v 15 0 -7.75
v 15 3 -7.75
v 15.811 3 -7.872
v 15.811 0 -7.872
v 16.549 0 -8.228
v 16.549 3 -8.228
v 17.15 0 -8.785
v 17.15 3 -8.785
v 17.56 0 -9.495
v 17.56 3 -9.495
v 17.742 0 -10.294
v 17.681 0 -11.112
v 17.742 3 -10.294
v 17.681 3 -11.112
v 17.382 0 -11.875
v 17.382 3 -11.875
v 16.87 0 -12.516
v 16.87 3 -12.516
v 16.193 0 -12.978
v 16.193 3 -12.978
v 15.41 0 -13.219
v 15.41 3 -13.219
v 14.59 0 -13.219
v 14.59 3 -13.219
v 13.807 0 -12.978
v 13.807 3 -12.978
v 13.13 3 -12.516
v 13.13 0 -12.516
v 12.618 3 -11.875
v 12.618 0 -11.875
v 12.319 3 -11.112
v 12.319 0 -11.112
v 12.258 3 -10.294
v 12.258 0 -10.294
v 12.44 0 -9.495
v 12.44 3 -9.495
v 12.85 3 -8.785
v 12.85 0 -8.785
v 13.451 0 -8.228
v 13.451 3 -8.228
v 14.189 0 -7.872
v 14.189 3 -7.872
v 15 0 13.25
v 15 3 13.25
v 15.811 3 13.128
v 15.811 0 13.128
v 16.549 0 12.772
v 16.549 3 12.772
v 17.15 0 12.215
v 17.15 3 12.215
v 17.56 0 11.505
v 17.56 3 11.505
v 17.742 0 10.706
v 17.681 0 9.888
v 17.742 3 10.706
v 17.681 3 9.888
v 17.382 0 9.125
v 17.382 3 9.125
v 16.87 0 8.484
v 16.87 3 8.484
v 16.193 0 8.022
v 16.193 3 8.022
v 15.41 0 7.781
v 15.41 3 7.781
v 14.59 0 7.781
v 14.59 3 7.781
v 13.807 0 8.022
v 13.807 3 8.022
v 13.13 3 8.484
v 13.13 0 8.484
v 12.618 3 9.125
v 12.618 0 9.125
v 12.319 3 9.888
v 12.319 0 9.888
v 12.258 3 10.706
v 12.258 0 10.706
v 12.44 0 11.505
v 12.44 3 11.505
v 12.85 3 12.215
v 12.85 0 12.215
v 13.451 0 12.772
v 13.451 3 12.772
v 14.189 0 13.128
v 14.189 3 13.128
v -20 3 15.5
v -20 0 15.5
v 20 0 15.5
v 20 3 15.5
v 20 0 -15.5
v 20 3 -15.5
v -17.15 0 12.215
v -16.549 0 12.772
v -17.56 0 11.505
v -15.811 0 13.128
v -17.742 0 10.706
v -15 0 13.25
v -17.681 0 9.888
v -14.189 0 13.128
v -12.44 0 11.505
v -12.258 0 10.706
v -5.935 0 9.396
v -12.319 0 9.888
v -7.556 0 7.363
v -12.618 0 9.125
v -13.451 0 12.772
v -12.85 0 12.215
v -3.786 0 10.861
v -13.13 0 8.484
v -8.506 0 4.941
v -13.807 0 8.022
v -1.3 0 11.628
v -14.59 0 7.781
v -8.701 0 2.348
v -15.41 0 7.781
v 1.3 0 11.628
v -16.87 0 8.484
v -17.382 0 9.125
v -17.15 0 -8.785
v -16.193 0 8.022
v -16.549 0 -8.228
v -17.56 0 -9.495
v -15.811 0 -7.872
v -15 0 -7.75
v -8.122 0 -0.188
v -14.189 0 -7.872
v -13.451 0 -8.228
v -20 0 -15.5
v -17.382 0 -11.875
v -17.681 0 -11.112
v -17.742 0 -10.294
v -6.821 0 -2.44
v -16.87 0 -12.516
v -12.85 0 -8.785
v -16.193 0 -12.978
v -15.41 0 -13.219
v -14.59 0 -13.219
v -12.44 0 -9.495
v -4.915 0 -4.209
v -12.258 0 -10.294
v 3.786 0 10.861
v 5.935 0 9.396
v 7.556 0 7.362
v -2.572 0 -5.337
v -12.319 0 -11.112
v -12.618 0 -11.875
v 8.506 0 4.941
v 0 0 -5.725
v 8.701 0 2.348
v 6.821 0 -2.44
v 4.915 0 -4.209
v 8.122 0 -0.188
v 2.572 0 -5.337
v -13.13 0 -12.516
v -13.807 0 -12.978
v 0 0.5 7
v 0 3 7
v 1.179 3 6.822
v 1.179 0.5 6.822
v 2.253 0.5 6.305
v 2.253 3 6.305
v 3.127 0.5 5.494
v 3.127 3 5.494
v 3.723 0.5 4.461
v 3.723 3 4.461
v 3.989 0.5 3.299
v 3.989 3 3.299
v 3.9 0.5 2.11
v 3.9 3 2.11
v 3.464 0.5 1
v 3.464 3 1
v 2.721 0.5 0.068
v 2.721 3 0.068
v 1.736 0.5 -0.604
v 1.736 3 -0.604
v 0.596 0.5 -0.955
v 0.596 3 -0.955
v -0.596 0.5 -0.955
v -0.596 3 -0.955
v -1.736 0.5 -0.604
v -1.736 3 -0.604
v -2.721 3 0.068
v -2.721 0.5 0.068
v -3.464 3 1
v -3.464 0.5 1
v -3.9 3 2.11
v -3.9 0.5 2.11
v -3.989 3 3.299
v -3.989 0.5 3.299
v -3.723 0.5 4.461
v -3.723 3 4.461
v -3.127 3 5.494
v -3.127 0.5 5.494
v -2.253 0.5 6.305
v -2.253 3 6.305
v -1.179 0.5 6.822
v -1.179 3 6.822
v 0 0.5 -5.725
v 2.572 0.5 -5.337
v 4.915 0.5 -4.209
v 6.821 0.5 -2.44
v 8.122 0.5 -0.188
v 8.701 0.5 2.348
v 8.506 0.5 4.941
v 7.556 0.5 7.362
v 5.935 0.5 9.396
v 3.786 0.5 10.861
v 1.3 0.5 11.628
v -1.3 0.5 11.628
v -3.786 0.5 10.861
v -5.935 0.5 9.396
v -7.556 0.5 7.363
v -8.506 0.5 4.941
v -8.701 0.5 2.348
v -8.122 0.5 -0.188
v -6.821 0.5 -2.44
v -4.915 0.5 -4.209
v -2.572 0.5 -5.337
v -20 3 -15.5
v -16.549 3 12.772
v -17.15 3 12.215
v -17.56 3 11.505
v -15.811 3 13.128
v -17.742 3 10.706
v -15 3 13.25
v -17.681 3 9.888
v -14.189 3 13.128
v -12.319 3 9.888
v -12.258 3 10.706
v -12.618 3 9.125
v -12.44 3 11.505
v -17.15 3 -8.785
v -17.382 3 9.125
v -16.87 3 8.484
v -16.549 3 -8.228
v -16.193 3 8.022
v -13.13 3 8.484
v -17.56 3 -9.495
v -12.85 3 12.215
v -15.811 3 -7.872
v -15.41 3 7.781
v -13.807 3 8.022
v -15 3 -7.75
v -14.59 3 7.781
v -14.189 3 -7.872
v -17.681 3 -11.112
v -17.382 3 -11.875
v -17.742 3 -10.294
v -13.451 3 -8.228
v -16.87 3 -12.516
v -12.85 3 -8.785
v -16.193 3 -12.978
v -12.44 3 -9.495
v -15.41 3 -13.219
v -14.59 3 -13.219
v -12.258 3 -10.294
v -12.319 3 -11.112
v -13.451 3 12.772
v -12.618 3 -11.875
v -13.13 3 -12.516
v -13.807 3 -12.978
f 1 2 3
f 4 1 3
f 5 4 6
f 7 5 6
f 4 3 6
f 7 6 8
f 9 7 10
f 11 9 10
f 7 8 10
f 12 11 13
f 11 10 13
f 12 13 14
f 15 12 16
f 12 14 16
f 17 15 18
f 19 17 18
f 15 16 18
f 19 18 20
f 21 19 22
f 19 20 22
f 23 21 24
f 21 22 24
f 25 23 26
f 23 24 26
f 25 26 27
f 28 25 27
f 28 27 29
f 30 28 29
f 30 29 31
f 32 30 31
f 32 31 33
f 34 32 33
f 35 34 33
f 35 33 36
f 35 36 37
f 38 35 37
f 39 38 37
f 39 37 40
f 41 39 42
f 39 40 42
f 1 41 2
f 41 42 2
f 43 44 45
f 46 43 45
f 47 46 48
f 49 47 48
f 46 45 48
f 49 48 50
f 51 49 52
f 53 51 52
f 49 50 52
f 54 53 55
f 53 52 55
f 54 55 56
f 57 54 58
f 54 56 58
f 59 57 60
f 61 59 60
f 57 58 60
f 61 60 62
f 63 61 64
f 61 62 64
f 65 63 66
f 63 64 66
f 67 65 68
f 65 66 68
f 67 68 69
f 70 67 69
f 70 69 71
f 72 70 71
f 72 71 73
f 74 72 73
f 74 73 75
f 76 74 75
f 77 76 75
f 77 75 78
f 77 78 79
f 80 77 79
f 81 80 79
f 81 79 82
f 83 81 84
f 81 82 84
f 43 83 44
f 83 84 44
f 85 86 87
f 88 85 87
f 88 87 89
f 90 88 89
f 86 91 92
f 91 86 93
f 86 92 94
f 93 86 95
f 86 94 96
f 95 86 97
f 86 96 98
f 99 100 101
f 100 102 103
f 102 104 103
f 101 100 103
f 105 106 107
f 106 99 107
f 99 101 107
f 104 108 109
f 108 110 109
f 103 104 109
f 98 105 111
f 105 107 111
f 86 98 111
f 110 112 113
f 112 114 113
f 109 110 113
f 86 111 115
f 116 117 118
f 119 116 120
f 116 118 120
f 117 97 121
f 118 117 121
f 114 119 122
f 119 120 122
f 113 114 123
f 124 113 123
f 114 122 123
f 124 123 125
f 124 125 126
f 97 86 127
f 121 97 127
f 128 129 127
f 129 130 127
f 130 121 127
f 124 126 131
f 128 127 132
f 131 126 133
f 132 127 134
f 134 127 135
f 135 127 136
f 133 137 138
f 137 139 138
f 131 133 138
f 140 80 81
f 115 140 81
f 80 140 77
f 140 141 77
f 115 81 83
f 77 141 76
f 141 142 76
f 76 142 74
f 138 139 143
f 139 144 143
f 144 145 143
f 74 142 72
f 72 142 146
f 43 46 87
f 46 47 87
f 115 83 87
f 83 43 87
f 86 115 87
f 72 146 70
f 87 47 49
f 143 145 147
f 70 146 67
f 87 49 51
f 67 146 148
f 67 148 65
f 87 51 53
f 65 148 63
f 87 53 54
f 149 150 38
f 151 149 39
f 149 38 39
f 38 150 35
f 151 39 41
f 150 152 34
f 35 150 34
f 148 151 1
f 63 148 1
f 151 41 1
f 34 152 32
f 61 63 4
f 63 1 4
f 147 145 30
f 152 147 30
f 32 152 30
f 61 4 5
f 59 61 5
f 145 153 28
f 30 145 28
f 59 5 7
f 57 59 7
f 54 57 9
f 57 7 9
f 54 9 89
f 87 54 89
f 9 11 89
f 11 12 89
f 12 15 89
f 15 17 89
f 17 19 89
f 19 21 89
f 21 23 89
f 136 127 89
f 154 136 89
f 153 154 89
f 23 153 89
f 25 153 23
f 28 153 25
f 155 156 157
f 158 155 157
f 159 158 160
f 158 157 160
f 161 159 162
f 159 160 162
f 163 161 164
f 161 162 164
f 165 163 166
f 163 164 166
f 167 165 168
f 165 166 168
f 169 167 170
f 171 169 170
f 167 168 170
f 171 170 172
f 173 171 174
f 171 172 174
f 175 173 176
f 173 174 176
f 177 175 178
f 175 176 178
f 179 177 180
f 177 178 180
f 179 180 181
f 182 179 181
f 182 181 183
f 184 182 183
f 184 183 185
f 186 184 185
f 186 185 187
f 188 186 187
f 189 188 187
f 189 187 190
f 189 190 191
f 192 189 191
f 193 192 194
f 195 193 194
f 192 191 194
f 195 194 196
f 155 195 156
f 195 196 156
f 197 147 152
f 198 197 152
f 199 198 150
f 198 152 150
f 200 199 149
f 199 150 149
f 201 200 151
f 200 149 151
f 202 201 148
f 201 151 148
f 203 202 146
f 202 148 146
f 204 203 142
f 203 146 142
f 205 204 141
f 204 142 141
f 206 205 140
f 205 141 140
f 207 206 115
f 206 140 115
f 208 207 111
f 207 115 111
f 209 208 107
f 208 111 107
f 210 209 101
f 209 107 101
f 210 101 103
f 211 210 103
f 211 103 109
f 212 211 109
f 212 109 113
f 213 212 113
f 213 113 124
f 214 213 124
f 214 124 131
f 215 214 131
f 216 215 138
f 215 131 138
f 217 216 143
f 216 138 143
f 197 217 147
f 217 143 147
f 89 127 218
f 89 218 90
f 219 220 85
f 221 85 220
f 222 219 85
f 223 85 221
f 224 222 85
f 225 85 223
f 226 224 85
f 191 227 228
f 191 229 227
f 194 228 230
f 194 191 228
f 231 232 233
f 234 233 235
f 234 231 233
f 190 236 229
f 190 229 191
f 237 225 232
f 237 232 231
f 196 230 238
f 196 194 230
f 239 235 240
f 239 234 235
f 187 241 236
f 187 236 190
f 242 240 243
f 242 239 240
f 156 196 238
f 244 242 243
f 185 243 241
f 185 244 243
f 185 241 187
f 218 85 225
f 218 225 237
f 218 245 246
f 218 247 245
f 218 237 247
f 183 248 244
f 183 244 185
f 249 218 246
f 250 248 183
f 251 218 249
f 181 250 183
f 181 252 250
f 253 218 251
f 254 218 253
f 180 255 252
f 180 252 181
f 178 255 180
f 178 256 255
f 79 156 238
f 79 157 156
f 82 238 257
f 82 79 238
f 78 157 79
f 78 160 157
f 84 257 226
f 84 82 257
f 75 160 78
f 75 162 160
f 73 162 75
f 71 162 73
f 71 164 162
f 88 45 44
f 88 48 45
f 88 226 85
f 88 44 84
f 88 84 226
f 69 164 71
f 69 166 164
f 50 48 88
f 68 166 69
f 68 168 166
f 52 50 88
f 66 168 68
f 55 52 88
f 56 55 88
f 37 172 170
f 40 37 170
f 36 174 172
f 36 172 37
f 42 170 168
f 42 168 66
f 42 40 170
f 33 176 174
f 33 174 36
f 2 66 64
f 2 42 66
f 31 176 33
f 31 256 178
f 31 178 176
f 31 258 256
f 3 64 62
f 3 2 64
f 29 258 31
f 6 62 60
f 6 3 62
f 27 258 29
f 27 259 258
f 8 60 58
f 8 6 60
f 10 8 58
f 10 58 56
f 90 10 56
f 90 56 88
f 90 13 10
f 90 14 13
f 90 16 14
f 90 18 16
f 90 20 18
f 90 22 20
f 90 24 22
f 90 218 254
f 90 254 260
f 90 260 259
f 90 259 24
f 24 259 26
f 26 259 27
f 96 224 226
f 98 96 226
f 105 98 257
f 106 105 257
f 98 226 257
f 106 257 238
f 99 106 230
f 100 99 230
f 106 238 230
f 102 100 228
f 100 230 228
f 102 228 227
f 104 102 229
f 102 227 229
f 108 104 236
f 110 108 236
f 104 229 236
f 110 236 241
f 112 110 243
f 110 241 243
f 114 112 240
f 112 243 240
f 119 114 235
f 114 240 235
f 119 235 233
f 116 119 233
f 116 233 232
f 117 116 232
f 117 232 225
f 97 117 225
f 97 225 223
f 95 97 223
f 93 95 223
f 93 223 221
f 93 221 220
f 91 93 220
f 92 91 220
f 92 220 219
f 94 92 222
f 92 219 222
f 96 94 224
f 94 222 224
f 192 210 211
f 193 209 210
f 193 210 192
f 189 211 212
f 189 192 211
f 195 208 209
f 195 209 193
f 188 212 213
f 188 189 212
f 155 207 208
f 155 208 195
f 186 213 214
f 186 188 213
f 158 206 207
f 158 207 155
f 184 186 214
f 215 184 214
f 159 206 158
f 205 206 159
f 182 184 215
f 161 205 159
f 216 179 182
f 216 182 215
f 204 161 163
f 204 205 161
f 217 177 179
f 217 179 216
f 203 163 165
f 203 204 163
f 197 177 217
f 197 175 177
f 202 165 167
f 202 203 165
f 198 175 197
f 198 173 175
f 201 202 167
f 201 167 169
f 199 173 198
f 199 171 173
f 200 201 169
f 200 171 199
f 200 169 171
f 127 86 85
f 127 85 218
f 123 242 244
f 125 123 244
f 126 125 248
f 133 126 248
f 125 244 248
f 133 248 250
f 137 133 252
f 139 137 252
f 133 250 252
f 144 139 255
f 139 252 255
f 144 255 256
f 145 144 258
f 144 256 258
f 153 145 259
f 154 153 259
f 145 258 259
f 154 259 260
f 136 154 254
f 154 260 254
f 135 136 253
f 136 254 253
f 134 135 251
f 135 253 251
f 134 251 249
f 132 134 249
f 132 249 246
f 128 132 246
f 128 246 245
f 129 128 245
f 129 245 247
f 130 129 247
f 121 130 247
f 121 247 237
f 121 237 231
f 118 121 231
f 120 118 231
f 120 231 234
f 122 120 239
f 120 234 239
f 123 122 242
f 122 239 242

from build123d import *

# Parameters (mm, degrees)
SKETCH1_W           = 40
SKETCH1_H           = 31
BOSS_EXTRUDE1_DEPTH = 3
SKETCH2_R           = 2.75
CUT_EXTRUDE1_DEPTH  = 3
SKETCH3_R           = 8.725
CUT_EXTRUDE2_DEPTH  = 0.5
SKETCH4_R           = 4
CUT_EXTRUDE3_DEPTH  = 2.5


with BuildPart() as part:
    # Sketch1 → Boss-Extrude1 (new body)
    with BuildSketch(Plane(origin=(0, 0, 0), x_dir=(1, 0, 0), z_dir=(0, 1, 0))):
        Rectangle(SKETCH1_W, SKETCH1_H)
    extrude(amount=BOSS_EXTRUDE1_DEPTH)

    # Sketch2 → Cut-Extrude1 (cut)
    with BuildSketch(Plane(origin=(0, 3, 0), x_dir=(1, 0, 0), z_dir=(0, 1, 0))):
        with Locations(Location((-15, 10.5, 0), (0, 0, 270))):
            Circle(SKETCH2_R)
        with Locations(Location((15, 10.5, 0), (0, 0, 270))):
            Circle(SKETCH2_R)
        with Locations(Location((15, -10.5, 0), (0, 0, 270))):
            Circle(SKETCH2_R)
        with Locations(Location((-15, -10.5, 0), (0, 0, 270))):
            Circle(SKETCH2_R)
    extrude(amount=-CUT_EXTRUDE1_DEPTH, mode=Mode.SUBTRACT)

    # Sketch3 → Cut-Extrude2 (cut)
    with BuildSketch(Plane.XZ):
        with Locations(Location((0, 3, 0), (0, 0, 270))):
            Circle(SKETCH3_R)
    extrude(amount=-CUT_EXTRUDE2_DEPTH, mode=Mode.SUBTRACT)

    # Sketch4 → Cut-Extrude3 (cut)
    with BuildSketch(Plane(origin=(0, 3, 0), x_dir=(1, 0, 0), z_dir=(0, 1, 0))):
        with Locations(Location((0, -3, 0), (0, 0, 270))):
            Circle(SKETCH4_R)
    extrude(amount=-CUT_EXTRUDE3_DEPTH, mode=Mode.SUBTRACT)


solid = part.part
